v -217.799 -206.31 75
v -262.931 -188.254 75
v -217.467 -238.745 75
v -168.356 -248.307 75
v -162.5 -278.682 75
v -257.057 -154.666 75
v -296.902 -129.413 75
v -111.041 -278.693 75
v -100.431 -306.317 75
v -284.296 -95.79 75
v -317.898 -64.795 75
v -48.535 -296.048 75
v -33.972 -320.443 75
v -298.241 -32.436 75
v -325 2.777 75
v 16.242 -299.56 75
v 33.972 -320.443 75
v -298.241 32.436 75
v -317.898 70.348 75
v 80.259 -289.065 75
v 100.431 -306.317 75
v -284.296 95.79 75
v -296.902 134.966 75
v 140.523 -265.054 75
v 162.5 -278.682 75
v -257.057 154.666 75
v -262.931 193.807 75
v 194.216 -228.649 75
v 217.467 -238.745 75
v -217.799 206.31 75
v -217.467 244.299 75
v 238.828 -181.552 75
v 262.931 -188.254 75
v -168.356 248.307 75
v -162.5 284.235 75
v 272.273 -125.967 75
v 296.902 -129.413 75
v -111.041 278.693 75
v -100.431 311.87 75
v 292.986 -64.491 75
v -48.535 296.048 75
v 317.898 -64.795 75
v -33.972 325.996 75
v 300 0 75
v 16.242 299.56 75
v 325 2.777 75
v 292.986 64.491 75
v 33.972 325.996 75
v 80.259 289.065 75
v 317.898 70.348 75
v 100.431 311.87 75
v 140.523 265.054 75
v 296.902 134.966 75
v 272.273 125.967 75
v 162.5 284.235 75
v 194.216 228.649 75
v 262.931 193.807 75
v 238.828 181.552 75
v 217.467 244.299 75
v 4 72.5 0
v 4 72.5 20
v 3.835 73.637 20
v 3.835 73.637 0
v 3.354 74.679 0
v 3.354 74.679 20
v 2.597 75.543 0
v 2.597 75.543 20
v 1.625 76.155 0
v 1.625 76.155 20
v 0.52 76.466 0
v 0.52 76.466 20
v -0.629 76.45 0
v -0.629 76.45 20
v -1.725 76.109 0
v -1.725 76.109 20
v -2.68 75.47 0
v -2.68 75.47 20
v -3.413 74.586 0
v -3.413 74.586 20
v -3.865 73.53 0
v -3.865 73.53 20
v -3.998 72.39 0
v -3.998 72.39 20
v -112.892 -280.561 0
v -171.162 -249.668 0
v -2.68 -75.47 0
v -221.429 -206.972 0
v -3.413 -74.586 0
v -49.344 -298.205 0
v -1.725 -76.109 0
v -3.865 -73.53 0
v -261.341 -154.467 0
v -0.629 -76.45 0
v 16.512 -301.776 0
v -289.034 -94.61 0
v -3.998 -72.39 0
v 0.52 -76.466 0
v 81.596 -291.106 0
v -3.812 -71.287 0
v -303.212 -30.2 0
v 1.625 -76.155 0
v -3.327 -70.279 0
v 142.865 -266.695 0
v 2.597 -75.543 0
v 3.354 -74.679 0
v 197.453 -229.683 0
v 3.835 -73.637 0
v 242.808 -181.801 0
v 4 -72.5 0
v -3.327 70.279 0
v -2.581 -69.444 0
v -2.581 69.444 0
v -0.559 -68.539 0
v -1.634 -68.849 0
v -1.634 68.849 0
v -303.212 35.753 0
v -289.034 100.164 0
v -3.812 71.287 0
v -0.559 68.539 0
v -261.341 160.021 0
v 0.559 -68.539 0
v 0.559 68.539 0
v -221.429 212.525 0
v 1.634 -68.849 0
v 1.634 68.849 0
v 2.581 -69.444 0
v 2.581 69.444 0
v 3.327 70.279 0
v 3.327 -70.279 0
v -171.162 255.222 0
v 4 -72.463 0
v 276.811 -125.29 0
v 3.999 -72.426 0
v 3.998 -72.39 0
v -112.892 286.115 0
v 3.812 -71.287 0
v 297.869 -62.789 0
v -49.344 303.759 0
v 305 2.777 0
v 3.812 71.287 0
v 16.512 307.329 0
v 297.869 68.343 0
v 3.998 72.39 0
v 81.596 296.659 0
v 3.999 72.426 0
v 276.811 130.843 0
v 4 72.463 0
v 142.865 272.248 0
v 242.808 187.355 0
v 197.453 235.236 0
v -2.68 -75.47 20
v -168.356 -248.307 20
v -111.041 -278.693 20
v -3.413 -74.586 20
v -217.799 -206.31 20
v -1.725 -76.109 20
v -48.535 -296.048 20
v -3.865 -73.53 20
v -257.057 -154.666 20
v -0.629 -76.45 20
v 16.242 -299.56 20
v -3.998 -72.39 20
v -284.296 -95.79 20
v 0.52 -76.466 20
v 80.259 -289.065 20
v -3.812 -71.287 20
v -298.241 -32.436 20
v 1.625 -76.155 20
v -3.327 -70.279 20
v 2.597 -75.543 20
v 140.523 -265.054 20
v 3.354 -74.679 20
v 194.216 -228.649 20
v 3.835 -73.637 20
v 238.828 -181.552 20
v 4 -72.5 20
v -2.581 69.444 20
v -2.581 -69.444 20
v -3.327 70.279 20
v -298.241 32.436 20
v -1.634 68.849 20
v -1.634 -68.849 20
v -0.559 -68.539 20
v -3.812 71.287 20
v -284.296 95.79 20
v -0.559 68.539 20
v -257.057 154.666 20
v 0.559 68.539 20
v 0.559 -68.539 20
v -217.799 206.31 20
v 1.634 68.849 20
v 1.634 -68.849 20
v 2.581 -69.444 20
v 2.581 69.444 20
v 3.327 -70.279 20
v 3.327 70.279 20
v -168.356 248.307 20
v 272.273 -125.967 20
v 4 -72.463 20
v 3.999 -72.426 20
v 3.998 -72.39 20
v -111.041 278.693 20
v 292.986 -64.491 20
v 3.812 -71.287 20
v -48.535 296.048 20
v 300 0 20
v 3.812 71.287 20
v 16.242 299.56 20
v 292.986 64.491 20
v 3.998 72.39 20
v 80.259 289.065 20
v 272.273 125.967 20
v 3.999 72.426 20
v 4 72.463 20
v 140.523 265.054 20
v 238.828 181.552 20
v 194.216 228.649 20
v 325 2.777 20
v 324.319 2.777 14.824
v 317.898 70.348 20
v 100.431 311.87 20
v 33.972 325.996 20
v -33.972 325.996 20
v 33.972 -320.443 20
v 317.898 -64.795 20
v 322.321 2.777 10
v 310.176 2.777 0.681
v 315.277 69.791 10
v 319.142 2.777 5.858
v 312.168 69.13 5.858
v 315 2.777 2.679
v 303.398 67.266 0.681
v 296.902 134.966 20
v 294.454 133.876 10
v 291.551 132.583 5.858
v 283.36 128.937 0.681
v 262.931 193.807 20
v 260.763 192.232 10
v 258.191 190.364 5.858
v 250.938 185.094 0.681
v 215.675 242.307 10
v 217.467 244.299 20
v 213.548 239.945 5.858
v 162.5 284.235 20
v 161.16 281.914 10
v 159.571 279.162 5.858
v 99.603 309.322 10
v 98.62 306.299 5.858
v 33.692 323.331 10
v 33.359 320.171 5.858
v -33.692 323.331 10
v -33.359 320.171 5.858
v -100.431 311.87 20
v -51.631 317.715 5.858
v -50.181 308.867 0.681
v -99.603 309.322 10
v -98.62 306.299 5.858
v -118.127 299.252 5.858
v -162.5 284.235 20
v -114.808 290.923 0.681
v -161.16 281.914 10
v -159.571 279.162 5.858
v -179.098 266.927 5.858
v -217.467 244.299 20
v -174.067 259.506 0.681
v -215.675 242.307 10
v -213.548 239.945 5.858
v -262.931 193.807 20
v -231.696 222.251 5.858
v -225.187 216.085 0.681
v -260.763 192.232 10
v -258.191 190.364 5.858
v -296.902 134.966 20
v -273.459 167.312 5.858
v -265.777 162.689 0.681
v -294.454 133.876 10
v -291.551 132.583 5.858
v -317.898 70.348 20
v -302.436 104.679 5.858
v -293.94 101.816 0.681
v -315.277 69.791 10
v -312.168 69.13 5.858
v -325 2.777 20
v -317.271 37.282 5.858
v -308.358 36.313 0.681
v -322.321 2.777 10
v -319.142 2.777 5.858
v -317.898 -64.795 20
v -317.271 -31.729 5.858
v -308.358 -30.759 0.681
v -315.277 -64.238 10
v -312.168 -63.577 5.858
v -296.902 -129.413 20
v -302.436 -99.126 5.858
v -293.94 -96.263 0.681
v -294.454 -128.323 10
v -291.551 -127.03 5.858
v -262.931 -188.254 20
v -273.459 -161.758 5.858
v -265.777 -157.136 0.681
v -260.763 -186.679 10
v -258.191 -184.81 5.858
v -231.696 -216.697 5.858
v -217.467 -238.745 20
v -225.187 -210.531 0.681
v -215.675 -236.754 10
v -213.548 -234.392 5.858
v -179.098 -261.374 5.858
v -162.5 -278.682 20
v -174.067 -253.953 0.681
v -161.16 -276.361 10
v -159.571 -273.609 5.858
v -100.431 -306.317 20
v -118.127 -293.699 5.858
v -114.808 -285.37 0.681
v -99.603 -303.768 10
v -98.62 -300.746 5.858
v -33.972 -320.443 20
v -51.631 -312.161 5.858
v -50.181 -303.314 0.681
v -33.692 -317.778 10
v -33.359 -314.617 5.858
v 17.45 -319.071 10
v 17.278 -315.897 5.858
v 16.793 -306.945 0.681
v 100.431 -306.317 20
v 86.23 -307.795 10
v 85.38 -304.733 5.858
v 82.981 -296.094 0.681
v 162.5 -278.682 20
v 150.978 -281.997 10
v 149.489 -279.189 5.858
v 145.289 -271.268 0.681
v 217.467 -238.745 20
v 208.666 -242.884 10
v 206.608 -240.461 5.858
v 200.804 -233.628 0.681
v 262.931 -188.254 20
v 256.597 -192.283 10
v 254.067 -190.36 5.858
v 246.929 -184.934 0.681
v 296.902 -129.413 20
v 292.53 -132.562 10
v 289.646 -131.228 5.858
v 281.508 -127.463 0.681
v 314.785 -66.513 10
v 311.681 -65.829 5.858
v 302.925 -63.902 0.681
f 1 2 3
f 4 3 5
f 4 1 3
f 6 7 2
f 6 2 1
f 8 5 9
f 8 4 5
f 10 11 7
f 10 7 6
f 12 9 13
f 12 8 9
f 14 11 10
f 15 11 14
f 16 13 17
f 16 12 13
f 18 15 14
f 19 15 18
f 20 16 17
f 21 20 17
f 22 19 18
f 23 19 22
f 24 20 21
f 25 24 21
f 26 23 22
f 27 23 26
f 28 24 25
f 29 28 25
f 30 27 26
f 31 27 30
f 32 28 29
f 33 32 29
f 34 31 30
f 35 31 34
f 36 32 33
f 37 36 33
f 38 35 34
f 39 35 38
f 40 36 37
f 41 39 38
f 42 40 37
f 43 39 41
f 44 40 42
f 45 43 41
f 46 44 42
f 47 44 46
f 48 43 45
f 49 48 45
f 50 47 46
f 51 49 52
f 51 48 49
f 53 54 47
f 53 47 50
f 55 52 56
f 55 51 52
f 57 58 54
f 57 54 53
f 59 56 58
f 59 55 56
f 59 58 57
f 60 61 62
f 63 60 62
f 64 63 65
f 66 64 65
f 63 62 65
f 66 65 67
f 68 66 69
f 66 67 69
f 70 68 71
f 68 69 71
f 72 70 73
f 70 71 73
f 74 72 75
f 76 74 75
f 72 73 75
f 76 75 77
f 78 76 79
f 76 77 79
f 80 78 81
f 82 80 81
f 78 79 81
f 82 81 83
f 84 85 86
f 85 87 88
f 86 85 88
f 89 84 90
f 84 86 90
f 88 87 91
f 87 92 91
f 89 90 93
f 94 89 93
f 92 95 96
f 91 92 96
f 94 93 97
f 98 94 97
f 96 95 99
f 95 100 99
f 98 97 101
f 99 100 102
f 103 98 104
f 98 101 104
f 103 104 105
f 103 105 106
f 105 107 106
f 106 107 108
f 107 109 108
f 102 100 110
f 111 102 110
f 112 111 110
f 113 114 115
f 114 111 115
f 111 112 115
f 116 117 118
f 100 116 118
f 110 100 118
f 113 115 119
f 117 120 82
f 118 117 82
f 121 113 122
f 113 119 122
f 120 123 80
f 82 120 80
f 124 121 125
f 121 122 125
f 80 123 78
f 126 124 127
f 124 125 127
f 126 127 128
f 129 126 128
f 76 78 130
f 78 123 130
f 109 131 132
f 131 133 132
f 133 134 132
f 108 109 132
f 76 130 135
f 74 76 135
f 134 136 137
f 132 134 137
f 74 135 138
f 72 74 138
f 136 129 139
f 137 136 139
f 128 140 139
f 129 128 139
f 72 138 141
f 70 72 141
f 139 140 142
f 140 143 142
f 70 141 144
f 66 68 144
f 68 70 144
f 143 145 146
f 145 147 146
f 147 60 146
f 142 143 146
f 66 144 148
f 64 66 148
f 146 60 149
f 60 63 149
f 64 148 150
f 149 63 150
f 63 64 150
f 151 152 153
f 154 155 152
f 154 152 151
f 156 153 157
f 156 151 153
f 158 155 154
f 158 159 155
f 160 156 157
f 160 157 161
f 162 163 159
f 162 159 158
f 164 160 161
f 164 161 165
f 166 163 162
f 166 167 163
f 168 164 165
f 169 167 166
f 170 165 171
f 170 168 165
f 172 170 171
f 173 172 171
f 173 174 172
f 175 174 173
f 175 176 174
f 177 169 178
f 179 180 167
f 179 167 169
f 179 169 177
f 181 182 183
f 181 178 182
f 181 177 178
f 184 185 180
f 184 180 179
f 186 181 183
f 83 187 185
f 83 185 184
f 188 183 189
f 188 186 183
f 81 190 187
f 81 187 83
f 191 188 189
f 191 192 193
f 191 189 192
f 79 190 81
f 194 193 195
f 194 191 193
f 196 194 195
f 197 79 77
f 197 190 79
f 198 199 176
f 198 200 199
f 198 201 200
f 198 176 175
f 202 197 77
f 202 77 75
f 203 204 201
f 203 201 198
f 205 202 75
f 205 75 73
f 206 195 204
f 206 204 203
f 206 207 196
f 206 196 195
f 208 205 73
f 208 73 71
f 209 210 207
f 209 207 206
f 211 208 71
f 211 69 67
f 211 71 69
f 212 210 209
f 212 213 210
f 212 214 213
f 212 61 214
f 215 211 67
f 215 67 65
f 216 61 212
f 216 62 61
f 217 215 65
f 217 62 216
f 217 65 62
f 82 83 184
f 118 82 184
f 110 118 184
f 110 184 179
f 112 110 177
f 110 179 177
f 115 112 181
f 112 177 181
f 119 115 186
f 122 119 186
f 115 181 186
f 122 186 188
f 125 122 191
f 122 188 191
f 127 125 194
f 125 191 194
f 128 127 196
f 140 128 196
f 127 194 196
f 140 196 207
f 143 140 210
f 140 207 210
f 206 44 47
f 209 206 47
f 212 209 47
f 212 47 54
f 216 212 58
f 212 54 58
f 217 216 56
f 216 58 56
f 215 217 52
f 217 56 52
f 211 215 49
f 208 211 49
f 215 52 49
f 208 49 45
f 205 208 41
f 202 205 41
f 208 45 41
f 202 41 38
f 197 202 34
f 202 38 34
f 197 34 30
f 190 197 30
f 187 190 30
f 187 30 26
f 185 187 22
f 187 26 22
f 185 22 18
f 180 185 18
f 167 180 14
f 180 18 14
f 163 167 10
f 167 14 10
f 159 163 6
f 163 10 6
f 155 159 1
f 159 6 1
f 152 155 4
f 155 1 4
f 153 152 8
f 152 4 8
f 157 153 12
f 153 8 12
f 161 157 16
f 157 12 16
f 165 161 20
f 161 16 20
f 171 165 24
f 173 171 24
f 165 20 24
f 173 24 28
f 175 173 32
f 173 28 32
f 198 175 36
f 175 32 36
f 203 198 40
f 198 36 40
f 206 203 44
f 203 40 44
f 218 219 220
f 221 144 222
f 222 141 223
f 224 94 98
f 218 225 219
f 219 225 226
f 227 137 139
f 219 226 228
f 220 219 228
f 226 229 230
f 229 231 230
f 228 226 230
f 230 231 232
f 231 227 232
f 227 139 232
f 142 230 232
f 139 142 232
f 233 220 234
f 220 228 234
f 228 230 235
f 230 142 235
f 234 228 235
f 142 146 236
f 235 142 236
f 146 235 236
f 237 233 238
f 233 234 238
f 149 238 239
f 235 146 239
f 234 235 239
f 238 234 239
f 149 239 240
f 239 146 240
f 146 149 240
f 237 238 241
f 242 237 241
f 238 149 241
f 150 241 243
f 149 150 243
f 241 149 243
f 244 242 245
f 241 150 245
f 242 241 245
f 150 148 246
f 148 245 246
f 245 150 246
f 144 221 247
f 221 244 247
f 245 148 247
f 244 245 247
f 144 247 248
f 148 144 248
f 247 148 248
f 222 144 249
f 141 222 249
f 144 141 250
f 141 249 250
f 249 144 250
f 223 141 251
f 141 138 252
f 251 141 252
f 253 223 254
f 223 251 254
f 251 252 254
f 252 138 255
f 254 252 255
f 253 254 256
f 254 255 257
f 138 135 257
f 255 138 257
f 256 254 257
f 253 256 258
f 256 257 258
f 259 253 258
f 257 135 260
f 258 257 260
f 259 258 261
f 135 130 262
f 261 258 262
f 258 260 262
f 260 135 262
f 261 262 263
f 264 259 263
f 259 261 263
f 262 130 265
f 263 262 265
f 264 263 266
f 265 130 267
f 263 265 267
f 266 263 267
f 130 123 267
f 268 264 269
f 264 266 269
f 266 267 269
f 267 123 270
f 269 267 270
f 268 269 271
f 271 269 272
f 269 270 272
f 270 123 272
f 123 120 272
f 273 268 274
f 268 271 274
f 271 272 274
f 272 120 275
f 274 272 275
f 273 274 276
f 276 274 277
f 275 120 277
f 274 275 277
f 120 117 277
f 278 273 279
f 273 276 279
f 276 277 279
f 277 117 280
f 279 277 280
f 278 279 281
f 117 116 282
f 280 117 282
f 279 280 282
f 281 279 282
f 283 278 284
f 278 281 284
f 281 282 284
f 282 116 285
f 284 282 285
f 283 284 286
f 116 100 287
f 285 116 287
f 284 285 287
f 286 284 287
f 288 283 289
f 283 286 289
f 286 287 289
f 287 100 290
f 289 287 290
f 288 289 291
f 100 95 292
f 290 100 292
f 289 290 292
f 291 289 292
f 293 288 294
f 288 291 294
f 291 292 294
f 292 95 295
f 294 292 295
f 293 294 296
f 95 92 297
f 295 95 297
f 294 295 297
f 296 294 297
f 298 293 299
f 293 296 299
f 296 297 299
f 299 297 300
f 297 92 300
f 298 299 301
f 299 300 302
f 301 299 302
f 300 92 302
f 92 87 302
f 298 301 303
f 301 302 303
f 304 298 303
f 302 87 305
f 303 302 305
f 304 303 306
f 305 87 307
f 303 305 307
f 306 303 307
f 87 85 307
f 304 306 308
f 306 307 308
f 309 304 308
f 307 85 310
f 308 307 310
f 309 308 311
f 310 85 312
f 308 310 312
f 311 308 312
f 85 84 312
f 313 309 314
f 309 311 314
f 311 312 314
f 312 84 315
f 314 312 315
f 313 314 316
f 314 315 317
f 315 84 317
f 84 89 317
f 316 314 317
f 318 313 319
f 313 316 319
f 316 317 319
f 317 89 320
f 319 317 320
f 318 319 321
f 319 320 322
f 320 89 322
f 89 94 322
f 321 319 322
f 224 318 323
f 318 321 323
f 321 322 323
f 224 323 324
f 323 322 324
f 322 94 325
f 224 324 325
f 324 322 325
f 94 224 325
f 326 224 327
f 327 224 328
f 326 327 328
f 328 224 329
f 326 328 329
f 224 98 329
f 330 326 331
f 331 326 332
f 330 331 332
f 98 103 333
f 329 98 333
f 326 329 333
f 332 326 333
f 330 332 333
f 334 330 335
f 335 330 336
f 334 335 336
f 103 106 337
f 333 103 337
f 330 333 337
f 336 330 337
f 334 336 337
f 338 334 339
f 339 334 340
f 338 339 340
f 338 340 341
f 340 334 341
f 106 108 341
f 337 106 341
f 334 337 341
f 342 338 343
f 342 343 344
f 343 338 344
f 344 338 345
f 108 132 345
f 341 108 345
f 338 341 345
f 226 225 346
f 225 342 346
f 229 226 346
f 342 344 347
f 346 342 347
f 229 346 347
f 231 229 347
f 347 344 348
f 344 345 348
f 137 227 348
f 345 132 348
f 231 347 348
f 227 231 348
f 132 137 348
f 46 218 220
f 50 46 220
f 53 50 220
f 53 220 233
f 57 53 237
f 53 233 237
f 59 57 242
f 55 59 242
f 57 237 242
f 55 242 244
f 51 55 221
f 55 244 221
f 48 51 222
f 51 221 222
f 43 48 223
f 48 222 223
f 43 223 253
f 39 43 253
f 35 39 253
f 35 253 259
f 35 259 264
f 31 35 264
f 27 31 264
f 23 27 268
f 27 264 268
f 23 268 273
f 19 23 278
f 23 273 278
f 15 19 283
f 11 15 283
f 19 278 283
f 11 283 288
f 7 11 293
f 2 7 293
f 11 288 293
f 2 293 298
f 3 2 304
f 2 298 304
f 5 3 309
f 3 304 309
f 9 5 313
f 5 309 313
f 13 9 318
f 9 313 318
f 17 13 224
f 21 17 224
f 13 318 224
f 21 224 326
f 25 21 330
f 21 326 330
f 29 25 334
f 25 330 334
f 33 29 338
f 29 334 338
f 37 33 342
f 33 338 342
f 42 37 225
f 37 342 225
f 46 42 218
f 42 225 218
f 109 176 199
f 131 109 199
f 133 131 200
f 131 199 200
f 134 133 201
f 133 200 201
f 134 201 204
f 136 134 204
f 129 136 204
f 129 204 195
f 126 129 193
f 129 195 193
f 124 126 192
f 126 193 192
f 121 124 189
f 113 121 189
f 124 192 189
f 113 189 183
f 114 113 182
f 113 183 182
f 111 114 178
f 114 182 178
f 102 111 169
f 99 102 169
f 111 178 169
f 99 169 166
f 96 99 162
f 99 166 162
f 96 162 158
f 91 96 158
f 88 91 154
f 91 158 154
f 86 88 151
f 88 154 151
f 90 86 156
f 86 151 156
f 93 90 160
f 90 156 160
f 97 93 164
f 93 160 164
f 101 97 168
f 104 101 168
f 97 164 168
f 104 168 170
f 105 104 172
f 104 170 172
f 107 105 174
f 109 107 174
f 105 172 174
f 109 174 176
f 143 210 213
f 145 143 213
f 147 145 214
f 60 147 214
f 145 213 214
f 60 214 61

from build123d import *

# Parameters (mm, degrees)
F0_R     = 325
F1_DEPTH = 75
F2_R     = 300
F3_DEPTH = 55
F4_R     = 20
F6_DEPTH = 25


with BuildPart() as f1:
    # F0 (on Top) → F1 (new body)
    with BuildSketch(Plane.XY):
        with Locations((0, 2.7766637504)):
            Circle(F0_R)
    extrude(amount=F1_DEPTH)

    # F2 (on face) → F3 (cut)
    with BuildSketch(Plane.XY.offset(75)):
        Circle(F2_R)
    extrude(amount=-F3_DEPTH, mode=Mode.SUBTRACT)

    # F4
    f4_edges = [f1.edges().sort_by_distance(p)[0] for p in [
        (-325, 2.776664, 0),
    ]]
    fillet(f4_edges, radius=F4_R)

    # F5 (on face) → F6 (cut)
    with BuildSketch(Plane.XY.offset(20)):
        with BuildLine():
            ThreePointArc((-3.9984777127, 72.3896551724), (0, 68.5), (3.9984777127, 72.3896551724))
            ThreePointArc((3.9984777127, 72.3896551724), (0, 72.5), (-3.9984777127, 72.3896551724))
        make_face()
        with BuildLine():
            ThreePointArc((-3.9984777127, 72.3896551724), (0, 72.5), (3.9984777127, 72.3896551724))
            ThreePointArc((3.9984777127, 72.3896551724), (3.9996194101, 72.4448223362), (4, 72.5))
            ThreePointArc((4, 72.5), (-0.0551776638, 76.4996194101), (-3.9984777127, 72.3896551724))
        make_face()
        with BuildLine():
            ThreePointArc((4, -72.5), (3.9996194101, -72.4448223362), (3.9984777127, -72.3896551724))
            ThreePointArc((3.9984777127, -72.3896551724), (0, -72.5), (-3.9984777127, -72.3896551724))
            ThreePointArc((-3.9984777127, -72.3896551724), (-0.0551776638, -76.4996194101), (4, -72.5))
        make_face()
        with BuildLine():
            ThreePointArc((-3.9984777127, -72.3896551724), (0, -72.5), (3.9984777127, -72.3896551724))
            ThreePointArc((3.9984777127, -72.3896551724), (0, -68.5), (-3.9984777127, -72.3896551724))
        make_face()
    extrude(amount=-F6_DEPTH, mode=Mode.SUBTRACT)


solid = f1.part
